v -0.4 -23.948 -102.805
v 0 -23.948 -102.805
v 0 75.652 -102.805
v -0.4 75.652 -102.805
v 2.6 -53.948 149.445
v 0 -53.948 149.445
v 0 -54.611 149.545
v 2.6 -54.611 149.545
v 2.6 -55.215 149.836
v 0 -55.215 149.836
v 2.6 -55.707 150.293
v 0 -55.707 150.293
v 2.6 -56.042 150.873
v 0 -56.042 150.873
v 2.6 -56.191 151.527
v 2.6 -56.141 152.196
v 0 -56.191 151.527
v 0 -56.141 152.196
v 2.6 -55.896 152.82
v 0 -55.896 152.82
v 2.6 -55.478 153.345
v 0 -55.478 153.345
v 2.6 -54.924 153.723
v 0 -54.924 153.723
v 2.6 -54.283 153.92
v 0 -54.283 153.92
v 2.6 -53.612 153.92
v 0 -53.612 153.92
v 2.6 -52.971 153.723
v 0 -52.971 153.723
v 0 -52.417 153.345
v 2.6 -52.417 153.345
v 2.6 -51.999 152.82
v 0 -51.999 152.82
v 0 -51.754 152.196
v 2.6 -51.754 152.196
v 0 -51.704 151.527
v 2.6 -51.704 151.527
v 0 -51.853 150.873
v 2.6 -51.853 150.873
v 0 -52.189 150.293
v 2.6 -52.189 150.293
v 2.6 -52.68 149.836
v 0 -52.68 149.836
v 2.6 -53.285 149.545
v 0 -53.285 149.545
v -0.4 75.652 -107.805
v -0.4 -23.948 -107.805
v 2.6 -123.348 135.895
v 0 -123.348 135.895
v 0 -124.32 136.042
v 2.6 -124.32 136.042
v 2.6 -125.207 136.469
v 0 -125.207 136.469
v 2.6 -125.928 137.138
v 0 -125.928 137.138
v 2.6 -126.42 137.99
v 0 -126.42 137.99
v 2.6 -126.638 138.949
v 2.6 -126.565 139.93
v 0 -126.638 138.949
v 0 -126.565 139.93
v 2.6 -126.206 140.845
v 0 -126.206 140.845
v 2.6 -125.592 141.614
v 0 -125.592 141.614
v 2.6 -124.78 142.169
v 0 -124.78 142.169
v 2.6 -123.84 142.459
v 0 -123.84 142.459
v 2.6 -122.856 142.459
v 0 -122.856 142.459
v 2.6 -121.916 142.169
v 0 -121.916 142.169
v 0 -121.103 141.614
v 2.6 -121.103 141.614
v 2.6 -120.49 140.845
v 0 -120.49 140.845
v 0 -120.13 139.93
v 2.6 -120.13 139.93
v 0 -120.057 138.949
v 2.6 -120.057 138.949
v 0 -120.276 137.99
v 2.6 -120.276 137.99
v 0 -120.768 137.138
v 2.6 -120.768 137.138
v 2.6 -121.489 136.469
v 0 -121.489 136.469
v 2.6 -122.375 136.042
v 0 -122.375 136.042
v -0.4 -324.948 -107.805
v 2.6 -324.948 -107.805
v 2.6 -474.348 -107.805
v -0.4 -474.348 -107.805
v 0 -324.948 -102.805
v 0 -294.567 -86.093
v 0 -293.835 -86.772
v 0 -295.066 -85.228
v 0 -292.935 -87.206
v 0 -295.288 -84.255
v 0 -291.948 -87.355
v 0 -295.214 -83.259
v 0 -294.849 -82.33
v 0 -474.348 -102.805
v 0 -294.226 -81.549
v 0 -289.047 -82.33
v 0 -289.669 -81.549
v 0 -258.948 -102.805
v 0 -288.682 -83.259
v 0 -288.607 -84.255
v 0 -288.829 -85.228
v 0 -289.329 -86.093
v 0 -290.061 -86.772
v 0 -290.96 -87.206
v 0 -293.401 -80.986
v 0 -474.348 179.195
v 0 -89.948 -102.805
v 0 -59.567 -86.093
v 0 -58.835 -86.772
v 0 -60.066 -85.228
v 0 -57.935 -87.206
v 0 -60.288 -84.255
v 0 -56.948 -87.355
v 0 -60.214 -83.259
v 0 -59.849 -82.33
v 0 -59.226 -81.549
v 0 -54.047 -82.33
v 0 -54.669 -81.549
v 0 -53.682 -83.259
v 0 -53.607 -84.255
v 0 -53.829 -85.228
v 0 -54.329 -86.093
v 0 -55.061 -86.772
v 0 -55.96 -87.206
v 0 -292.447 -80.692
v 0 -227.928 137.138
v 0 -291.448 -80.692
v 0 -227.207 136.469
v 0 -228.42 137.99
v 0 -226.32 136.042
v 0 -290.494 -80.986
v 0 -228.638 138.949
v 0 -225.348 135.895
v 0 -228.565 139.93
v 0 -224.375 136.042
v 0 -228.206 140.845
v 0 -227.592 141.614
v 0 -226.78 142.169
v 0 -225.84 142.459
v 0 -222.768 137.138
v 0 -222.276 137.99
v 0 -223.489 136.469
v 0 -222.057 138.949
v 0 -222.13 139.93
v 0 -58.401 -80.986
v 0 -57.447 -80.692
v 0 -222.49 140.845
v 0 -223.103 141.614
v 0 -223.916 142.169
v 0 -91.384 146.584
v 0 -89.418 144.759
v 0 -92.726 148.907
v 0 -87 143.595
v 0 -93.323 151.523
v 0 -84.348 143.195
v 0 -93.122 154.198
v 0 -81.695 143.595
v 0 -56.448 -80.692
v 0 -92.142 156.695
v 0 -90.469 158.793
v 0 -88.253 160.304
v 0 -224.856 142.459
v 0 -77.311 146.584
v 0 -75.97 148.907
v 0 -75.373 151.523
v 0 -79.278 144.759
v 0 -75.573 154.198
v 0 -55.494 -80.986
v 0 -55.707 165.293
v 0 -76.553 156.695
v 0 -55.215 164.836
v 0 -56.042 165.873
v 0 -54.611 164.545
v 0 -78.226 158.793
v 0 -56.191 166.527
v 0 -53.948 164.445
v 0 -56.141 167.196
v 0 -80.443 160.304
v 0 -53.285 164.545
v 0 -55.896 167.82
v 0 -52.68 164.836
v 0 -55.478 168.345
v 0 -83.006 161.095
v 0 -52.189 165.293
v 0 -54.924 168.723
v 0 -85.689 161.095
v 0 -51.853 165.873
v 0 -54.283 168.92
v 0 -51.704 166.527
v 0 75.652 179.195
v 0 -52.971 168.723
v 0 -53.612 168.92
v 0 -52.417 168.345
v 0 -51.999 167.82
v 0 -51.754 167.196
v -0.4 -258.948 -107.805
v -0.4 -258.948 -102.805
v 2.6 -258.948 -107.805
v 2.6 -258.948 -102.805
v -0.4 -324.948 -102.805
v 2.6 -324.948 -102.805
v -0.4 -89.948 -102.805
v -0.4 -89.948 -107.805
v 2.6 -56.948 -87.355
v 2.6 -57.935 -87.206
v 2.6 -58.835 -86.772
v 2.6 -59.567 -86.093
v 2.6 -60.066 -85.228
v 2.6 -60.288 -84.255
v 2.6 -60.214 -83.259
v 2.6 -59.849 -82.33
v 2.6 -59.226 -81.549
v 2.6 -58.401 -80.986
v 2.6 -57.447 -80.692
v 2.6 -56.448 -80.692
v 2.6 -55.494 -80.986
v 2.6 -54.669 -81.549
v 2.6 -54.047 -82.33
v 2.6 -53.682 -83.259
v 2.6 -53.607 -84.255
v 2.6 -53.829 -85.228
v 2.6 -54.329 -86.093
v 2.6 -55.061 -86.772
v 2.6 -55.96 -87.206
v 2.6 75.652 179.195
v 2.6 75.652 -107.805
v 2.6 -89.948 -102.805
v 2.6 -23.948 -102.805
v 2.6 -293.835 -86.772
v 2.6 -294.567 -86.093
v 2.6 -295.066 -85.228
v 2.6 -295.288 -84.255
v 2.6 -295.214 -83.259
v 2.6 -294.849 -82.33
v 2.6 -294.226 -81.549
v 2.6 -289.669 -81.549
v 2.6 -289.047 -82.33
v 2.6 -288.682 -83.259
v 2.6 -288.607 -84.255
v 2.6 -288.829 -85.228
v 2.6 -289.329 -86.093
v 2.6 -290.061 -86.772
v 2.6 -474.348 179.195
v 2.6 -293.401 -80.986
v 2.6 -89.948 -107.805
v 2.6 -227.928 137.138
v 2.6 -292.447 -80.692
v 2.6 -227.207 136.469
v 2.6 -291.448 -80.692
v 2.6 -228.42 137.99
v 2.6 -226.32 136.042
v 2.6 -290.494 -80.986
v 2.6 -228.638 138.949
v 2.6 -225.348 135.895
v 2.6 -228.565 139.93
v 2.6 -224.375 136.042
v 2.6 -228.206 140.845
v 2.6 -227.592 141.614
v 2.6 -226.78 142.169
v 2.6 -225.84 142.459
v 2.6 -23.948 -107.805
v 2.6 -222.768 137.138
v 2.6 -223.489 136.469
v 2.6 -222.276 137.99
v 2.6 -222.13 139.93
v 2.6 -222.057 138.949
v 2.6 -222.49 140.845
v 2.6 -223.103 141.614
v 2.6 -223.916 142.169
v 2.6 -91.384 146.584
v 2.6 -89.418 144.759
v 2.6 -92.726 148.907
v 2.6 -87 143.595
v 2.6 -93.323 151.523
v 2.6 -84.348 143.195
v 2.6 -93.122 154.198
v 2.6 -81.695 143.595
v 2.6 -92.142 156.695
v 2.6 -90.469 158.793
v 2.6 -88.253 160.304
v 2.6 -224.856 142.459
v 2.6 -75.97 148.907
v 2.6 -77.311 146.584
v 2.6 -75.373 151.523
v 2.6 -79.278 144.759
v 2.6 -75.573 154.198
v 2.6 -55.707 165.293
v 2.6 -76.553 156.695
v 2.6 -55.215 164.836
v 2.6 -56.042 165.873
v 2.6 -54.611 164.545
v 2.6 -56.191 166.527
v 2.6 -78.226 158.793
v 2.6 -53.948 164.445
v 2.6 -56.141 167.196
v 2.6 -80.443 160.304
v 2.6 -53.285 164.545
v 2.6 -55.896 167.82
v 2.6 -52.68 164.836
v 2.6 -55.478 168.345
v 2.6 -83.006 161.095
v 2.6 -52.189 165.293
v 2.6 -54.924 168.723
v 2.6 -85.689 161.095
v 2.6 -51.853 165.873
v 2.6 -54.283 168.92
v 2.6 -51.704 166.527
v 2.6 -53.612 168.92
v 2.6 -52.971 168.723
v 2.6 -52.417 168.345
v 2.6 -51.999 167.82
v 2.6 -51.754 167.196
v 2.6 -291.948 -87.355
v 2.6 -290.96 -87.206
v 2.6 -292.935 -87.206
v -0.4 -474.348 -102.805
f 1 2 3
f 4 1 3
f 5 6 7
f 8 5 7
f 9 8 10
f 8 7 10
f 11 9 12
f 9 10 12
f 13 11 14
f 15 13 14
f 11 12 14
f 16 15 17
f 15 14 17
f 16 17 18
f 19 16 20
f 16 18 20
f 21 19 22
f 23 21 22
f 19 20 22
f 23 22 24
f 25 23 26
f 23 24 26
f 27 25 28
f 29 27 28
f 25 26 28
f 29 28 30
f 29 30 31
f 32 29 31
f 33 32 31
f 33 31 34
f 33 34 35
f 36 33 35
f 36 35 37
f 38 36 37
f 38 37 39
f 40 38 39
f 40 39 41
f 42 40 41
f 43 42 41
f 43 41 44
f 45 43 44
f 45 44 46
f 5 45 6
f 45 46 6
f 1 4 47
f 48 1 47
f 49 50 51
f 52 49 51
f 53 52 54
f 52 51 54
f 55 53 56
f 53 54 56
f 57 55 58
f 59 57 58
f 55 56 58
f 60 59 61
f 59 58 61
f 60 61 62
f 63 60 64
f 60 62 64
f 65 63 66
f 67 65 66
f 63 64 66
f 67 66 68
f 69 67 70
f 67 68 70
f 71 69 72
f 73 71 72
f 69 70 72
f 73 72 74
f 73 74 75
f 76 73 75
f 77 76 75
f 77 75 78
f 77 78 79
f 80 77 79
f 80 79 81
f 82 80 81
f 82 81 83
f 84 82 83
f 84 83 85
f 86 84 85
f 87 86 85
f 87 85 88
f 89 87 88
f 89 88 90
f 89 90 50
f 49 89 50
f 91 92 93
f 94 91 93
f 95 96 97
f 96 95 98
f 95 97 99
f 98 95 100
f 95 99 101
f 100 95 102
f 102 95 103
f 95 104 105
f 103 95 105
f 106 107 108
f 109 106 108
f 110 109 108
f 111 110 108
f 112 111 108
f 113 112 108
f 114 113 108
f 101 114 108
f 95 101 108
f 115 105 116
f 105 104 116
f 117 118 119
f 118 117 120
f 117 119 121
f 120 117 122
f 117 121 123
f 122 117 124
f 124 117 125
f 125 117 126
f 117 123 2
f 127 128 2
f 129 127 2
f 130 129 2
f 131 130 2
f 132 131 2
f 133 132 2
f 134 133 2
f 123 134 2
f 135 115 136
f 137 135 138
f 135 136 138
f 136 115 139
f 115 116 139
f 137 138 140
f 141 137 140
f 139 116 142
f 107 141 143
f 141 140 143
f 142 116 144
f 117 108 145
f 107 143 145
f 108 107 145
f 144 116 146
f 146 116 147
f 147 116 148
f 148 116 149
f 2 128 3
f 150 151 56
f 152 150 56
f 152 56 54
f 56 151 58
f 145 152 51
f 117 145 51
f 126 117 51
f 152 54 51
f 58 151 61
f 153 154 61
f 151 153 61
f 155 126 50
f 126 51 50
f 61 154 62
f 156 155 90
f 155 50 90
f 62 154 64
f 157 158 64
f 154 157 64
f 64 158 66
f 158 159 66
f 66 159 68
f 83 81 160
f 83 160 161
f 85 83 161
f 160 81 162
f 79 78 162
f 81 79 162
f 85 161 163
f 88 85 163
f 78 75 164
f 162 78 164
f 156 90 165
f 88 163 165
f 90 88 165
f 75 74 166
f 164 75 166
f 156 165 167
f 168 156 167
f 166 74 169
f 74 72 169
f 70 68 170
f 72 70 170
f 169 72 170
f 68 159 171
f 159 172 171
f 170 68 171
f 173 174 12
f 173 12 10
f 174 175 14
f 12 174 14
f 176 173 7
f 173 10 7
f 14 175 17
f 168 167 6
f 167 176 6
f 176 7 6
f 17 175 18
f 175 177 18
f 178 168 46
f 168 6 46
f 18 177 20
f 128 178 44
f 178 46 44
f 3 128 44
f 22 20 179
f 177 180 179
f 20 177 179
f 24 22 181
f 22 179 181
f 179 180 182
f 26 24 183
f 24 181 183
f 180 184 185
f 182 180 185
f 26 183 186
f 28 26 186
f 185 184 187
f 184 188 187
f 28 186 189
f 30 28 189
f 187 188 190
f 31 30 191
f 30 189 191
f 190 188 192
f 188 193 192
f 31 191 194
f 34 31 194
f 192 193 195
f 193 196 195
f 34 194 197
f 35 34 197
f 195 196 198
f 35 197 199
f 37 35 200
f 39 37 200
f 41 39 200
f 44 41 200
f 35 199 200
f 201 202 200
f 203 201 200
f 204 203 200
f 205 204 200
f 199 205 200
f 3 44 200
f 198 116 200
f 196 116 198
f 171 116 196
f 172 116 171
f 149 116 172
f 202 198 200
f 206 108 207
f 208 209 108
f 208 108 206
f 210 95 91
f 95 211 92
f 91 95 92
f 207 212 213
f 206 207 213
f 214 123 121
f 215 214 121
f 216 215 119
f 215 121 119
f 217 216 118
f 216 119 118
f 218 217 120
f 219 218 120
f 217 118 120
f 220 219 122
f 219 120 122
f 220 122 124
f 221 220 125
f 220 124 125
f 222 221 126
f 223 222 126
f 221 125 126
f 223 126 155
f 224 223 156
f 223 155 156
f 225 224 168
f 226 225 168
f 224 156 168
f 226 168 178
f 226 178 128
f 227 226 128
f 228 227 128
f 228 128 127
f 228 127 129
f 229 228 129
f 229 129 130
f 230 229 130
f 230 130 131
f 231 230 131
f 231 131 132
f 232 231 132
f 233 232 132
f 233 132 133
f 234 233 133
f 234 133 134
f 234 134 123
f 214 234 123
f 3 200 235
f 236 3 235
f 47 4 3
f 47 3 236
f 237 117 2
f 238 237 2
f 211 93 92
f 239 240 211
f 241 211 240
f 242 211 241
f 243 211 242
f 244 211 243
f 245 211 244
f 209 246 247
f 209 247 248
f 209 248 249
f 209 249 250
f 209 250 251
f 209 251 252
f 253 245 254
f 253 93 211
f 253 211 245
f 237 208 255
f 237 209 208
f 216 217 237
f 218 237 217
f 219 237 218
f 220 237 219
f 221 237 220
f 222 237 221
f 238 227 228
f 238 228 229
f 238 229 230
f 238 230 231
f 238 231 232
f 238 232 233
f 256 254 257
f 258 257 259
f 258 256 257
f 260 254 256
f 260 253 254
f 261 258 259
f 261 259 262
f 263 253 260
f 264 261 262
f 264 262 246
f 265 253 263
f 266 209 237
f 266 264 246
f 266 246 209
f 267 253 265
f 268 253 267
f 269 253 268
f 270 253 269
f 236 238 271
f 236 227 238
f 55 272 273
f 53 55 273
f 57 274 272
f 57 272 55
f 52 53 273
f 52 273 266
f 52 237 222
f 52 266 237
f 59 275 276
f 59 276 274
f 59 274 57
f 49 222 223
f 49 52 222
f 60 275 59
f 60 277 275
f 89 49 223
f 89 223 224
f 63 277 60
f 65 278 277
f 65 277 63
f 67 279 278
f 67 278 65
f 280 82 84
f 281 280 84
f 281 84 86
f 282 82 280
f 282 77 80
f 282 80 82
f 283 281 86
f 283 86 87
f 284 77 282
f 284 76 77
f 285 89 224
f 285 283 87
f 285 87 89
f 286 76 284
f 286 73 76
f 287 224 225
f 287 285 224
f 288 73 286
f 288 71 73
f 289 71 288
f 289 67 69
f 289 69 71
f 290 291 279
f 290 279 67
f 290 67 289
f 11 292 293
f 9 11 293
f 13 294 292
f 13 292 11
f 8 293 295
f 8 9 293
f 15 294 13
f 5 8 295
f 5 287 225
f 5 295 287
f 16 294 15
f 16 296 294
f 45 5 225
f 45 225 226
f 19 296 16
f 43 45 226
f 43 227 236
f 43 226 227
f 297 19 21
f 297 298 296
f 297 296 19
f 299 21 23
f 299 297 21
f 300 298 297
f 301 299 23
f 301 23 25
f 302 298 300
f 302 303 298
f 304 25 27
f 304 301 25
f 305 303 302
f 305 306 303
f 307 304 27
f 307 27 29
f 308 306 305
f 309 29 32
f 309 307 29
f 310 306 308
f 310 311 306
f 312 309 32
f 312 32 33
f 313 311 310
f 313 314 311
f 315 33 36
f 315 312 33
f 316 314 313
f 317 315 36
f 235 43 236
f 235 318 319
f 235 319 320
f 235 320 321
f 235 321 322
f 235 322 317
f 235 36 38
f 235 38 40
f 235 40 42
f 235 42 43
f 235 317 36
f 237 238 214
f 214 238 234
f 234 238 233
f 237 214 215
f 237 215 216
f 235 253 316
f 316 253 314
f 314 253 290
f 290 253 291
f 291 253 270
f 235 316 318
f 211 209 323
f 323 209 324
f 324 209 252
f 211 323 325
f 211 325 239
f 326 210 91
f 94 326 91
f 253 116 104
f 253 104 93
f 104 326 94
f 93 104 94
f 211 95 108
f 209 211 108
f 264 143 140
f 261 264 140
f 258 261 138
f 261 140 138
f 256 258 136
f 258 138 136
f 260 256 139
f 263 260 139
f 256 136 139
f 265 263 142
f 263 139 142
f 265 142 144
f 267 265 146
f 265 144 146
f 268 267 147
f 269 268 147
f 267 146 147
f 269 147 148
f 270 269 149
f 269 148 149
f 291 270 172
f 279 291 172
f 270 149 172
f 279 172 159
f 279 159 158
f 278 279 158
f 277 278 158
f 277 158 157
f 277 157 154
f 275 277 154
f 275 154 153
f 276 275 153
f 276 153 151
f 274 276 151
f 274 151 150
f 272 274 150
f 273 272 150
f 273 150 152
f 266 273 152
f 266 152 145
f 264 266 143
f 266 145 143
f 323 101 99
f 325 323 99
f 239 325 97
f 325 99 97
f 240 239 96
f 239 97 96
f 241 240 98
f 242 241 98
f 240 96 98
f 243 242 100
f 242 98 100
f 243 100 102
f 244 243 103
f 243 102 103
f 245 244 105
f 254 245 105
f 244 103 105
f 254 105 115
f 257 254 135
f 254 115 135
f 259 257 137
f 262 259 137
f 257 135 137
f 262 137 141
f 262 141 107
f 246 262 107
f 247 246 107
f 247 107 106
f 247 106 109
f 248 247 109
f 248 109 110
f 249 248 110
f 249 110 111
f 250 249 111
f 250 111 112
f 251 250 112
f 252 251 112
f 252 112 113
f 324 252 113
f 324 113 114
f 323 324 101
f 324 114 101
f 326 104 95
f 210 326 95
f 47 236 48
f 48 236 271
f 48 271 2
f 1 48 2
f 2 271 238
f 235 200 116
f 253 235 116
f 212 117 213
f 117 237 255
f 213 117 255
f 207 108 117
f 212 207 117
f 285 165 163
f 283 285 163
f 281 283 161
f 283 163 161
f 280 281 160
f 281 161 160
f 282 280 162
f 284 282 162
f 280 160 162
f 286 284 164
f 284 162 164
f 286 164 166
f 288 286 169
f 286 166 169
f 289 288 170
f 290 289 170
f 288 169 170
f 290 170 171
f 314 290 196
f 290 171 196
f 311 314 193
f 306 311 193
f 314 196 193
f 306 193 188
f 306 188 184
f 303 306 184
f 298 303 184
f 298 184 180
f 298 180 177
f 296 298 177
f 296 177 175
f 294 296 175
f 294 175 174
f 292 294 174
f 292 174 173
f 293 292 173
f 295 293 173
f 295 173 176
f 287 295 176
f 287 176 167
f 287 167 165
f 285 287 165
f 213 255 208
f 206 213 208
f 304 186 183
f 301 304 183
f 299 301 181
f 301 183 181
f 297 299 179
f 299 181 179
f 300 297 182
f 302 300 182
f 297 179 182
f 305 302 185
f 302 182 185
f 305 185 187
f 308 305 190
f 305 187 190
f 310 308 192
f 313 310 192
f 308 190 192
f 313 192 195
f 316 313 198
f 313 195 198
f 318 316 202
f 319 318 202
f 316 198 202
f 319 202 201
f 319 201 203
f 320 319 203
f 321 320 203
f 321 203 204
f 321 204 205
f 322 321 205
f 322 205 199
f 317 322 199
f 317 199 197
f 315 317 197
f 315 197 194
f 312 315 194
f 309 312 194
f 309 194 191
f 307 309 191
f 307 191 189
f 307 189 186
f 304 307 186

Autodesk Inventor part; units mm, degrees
ref_plane "YZ Plane" through (0, 0, 0) normal (1, 0, 0) x (0, 1, 0)
ref_plane "XZ Plane" through (0, 0, 0) normal (0, 1, 0) x (-1, 0, 0)
sketch "スケッチ1" plane through (0, 0, 0) normal (1, 0, 0) x (0, 1, 0)
  line L0 (125.6523, 179.1954) -> (-474.3477, 179.1954)
  line L1 (-474.3477, 179.1954) -> (-474.3477, -102.8046)
  line L2 (-474.3477, -102.8046) -> (125.6523, -102.8046)
  line L3 (125.6523, -102.8046) -> (125.6523, 179.1954)
  dimension "d0" = 600
  dimension "d1" = 282
extrude "押し出し1" add sketch "スケッチ1" along normal blind 2.6
sketch "スケッチ4" plane through (2.6, 0, 0) normal (1, 0, 0) x (0, 0, -1)
  line L0 (102.8046, 125.6523) -> (-179.1954, 125.6523) projected
  line L1 (-179.1954, 125.6523) -> (-179.1954, -474.3477) projected
  point P0 (0, 0)
  point P1 (-139.1954, -225.3477)
  point P2 (-139.1954, -123.3477)
  dimension "d19" = 102
  dimension "d20" = 249
  dimension "d21" = 40
  dimension "d22" = 40
hole "穴2" at (2.6, -225.3477, 139.1954) at (2.6, -123.3477, 139.1954) direction (-1, 0, 0) diameter 6.6 end through all
sketch "スケッチ5" plane through (2.6, 0, 0) normal (1, 0, 0) x (0, 0, -1)
  line L0 (-179.1954, 125.6523) -> (-179.1954, -474.3477) projected
  line L1 (102.8046, 125.6523) -> (-179.1954, 125.6523) projected
  point P0 (-152.1954, -84.3477)
  dimension "d30" = 27
  dimension "d31" = 210
hole "穴3" at (2.6, -84.3477, 152.1954) direction (-1, 0, 0) diameter 18 end through all
sketch "スケッチ6" plane through (2.6, 0, 0) normal (1, 0, 0) x (0, 0, -1)
  line L0 (-179.1954, 125.6523) -> (-179.1954, -474.3477) projected
  circle A0 centre (-152.1954, -84.3477) radius 9 projected
  point P0 (0, 0)
  point P1 (-166.6954, -53.9477)
  point P2 (-151.6954, -53.9477)
  dimension "d39" = 12.5
  dimension "d40" = 27.5
  dimension "d41" = 30.4
  dimension "d42" = 30.4
hole "穴4" at (2.6, -53.9477, 166.6954) at (2.6, -53.9477, 151.6954) direction (-1, 0, 0) diameter 4.5 end through all
sketch "スケッチ7" plane through (2.6, 0, 0) normal (1, 0, 0) x (0, 0, -1)
  line L0 (102.8046, 125.6523) -> (-179.1954, 125.6523) projected
  line L1 (102.8046, -474.3477) -> (102.8046, 125.6523) projected
  line L2 (-179.1954, -474.3477) -> (102.8046, -474.3477) projected
  point P0 (0, 0)
  point P1 (84.0046, -56.9477)
  point P2 (84.0046, -291.9477)
  dimension "d50" = 182.6
  dimension "d51" = 18.8
  dimension "d52" = 18.8
  dimension "d53" = 182.4
hole "穴5" at (2.6, -56.9477, -84.0046) at (2.6, -291.9477, -84.0046) direction (-1, 0, 0) diameter 6.7 end through all
sketch "スケッチ8" plane through (2.6, 0, 0) normal (1, 0, 0) x (0, 0, -1)
  line L0 (102.8046, -474.3477) -> (102.8046, 125.6523) projected
  line L1 (102.8046, 125.6523) -> (107.8046, 125.6523)
  line L2 (117.7603, -23.9477) -> (102.8046, -23.9477)
  line L3 (102.8046, -89.9477) -> (117.7603, -89.9477)
  line L4 (107.8046, 125.6523) -> (107.8046, -474.3477)
  line L5 (107.8046, -474.3477) -> (102.8046, -474.3477)
  line L6 (102.8046, -258.9477) -> (107.8046, -258.9477)
  line L7 (102.8046, -324.9477) -> (107.8046, -324.9477)
  circle A0 centre (84.0046, -56.9477) radius 3.35 projected
  circle A1 centre (84.0046, -291.9477) radius 3.35 projected
  point P0 (0, 0)
  point P1 (107.8046, -23.9477)
  point P2 (107.8046, -89.9477)
  dimension "d61" = 5
  dimension "d62" = 33
  dimension "d63" = 33
  dimension "d64" = 33
  dimension "d65" = 33
extrude "押し出し3" add sketch "スケッチ8" against normal blind 3 contours L0 L7 L4 L5 | L0 L3 L4 L6 | L0 L1 L4 L2
sketch "スケッチ9" plane through (2.6, 0, 0) normal (1, 0, 0) x (0, 0, -1)
  ellipse E0 centre (-2.4593, 110.6523) end of major axis (-2.4593, 125.1521) minor radius 14.4996 (5.606, 98.6026) -> (5.606, 122.702) ccw
  line L0 (4.4935, 123.5363) -> (-99.9579, 123.5363) projected
  line L1 (-99.9579, 97.7683) -> (4.4935, 97.7683) projected
  ellipse E1 centre (-67.383, 110.6523) end of major axis (-67.383, 123.067) minor radius 12.4145 (-70.683, 122.6204) -> (-70.683, 98.6842) ccw projected
  line L2 (-70.683, 122.6204) -> (-70.683, 125.6523)
  line L3 (102.8046, 125.6523) -> (-179.1954, 125.6523) projected
  line L4 (5.7266, 122.6204) -> (5.7266, 125.6523)
  line L5 (5.7266, 125.6523) -> (-70.683, 125.6523)
  line L6 (6.1243, 98.9661) -> (4.4935, 97.7683)
  line L7 (-70.683, 98.6842) -> (-66.6998, 97.7683)
  point P0 (0, 0)
extrude "押し出し4" cut sketch "スケッチ9" against normal blind 3
ref_plane "作業平面1" through (0, 75.6523, 179.1954) normal (0, 1, 0) x (1, 0, 0)
split "分割1" plane through (0, 75.6523, 179.1954) removes the side toward (0, 1, 0)
properties part number "lc_box_side" material "ポリカーボネート、クリア"
